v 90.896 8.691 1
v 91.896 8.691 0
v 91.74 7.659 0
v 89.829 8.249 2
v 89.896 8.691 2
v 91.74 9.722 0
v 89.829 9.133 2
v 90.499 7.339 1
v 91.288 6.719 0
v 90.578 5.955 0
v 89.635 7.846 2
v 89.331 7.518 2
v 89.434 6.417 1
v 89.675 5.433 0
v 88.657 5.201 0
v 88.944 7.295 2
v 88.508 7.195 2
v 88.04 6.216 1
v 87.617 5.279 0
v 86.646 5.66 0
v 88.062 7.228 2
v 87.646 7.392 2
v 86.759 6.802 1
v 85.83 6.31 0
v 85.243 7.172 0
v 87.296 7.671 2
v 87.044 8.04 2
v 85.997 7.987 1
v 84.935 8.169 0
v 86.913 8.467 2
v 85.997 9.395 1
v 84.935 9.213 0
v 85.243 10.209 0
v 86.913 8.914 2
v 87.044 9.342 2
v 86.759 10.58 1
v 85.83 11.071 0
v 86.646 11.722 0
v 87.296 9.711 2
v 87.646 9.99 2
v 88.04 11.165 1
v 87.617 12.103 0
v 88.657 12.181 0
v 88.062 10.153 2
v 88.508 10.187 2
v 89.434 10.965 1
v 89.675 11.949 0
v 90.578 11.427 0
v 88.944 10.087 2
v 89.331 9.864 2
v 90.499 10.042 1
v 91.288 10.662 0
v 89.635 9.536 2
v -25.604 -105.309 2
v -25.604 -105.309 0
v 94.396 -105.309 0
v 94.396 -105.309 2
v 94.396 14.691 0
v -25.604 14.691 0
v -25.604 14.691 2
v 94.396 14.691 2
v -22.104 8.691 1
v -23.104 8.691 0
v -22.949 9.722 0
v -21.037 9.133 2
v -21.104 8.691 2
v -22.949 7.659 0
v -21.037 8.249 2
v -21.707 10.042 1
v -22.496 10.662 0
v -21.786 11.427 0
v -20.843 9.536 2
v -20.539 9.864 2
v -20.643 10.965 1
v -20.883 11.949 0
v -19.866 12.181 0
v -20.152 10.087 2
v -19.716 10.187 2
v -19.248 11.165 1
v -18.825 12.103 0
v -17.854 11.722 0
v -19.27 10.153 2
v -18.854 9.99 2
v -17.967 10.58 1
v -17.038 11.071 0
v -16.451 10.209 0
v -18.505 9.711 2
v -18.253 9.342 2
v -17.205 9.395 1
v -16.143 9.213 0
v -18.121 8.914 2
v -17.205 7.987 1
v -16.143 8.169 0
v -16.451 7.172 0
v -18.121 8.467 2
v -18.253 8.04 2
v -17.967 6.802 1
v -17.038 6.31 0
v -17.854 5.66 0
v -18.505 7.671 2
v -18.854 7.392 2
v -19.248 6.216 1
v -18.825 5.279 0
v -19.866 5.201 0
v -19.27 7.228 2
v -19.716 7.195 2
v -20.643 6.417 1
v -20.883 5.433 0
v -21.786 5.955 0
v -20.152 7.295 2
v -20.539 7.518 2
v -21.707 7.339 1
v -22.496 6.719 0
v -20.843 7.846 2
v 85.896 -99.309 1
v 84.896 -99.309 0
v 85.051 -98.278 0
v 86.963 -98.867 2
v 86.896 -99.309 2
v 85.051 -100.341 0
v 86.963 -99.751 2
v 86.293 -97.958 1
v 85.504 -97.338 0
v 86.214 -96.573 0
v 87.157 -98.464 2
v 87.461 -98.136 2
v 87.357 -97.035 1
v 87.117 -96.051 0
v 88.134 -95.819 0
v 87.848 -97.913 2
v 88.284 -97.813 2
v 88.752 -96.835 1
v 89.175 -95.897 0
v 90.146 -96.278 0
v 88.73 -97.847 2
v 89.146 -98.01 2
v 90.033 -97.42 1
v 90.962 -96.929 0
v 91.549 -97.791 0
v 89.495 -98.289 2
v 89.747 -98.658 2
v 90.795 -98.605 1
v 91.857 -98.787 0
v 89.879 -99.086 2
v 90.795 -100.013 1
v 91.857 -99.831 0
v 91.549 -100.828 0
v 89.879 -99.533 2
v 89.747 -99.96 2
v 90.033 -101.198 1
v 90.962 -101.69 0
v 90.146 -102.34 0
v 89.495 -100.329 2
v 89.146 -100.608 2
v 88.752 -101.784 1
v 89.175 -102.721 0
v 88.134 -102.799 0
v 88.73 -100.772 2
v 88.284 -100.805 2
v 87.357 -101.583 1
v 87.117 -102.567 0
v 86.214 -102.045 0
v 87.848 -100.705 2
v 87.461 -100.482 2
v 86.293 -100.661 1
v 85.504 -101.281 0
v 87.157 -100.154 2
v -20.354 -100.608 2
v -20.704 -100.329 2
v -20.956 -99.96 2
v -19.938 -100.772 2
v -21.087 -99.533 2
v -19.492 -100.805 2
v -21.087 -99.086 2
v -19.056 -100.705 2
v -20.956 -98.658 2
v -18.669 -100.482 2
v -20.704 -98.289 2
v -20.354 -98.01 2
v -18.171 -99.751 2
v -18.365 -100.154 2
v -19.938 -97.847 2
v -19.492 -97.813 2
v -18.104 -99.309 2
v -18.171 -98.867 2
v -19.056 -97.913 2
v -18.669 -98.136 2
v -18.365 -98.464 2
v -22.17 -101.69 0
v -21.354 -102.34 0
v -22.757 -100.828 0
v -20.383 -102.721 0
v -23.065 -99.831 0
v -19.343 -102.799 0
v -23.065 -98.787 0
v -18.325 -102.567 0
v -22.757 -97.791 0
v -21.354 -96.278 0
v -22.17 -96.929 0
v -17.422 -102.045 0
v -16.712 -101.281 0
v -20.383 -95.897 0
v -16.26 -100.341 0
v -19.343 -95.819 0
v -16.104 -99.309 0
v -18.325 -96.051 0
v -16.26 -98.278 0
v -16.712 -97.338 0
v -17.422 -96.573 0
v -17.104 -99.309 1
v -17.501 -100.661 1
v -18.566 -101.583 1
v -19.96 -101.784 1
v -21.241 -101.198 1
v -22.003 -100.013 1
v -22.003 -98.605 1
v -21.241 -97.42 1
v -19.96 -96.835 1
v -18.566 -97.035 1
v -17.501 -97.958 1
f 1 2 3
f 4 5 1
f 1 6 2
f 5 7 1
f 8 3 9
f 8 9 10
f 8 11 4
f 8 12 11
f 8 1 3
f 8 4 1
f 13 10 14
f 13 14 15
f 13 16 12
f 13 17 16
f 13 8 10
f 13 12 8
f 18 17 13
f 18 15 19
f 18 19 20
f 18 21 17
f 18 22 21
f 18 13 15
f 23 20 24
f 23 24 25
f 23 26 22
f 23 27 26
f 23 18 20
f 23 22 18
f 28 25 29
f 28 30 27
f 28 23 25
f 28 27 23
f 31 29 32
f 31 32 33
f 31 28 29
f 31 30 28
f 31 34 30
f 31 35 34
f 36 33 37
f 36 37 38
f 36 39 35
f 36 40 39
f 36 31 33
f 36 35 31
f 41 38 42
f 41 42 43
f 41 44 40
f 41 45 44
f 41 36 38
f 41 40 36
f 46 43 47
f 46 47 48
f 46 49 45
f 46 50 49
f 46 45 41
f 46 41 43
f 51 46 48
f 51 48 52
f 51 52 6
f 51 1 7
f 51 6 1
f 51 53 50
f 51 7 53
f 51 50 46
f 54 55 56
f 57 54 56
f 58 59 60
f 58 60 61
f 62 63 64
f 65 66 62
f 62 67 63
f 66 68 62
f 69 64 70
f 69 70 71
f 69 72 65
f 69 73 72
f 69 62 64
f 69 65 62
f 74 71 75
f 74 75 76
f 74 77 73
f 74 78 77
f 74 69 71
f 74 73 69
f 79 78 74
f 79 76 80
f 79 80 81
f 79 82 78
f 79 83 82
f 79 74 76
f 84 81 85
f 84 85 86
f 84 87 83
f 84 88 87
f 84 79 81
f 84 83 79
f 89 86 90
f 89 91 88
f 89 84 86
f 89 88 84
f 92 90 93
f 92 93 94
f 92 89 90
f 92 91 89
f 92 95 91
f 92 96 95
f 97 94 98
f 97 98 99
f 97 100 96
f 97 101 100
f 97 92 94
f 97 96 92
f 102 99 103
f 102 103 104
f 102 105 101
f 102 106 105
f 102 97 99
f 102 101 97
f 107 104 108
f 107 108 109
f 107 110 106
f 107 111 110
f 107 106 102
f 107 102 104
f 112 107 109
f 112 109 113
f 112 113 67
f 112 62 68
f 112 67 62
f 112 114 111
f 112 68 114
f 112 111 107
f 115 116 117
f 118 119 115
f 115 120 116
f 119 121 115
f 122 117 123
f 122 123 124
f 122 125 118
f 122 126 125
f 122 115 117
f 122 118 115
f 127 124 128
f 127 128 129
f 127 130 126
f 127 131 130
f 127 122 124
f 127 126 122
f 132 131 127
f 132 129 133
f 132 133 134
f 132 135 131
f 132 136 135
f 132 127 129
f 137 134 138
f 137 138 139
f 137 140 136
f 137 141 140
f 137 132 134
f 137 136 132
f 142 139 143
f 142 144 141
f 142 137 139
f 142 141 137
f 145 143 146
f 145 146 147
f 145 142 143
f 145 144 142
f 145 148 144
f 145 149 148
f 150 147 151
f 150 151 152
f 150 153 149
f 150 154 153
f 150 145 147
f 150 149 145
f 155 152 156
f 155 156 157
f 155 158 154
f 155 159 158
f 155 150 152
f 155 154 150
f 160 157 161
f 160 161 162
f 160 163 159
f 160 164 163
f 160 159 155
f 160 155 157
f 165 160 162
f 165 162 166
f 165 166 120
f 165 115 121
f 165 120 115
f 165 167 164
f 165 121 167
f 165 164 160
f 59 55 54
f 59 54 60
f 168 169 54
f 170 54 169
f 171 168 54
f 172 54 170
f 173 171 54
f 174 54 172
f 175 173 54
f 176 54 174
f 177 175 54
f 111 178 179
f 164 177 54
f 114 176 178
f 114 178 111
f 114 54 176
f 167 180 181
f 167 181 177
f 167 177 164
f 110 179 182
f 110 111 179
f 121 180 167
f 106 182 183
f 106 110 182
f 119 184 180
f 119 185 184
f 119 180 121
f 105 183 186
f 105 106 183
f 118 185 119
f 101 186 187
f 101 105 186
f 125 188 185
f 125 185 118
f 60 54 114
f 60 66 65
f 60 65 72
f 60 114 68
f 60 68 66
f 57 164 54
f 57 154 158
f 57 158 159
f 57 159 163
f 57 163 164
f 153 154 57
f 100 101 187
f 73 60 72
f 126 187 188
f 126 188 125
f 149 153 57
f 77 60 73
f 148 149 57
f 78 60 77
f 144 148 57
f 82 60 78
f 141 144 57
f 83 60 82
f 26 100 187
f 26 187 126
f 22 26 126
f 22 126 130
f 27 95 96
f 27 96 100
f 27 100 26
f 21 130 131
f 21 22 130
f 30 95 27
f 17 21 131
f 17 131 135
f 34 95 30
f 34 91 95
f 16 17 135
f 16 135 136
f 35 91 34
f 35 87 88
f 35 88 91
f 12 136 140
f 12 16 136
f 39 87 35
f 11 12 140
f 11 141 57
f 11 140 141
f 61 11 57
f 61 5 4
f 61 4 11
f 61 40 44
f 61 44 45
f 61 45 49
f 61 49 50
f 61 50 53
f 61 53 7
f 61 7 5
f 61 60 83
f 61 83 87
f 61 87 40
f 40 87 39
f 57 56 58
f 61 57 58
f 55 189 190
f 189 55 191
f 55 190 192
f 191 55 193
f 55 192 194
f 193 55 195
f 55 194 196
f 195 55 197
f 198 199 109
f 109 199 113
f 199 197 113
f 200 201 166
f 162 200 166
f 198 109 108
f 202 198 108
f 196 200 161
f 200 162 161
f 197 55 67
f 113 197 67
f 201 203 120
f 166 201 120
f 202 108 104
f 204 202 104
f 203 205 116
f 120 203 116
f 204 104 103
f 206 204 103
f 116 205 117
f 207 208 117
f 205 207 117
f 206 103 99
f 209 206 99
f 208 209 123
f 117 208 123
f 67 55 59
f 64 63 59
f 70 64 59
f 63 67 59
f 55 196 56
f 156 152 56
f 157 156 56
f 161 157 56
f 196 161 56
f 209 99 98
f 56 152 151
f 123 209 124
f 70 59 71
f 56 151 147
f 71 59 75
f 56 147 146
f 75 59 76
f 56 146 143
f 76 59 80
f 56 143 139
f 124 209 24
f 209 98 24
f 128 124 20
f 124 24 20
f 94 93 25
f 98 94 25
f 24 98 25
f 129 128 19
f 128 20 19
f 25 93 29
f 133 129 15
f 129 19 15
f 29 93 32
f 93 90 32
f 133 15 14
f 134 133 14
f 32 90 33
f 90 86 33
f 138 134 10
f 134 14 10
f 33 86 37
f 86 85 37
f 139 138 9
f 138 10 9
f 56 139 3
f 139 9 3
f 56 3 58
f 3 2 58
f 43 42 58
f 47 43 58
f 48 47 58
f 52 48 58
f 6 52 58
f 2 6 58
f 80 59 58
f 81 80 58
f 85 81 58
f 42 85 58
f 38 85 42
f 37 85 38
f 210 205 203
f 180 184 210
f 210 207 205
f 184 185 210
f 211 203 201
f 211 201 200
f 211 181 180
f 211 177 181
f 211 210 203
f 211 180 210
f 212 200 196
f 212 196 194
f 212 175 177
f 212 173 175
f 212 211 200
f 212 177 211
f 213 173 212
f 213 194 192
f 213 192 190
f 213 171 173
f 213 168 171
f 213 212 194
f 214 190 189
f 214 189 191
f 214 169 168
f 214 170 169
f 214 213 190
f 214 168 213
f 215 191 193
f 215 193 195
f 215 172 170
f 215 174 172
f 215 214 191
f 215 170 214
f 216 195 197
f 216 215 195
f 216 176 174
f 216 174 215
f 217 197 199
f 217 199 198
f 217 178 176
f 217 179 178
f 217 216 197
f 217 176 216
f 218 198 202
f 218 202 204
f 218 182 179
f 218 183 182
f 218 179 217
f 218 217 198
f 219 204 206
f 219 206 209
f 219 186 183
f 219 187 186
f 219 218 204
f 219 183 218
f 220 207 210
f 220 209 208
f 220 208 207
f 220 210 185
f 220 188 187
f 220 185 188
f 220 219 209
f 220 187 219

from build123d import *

# Parameters (mm, degrees)
SKETCH1_W           = 120
SKETCH1_H           = 120
BOSS_EXTRUDE1_DEPTH = 2
SKETCH2_R           = 1.5
CUT_EXTRUDE1_DEPTH  = 3
CHAMFER1_SIZE       = 2


with BuildPart() as part:
    # Sketch1 → Boss-Extrude1 (new body)
    with BuildSketch(Plane.XY):
        with Locations((34.39590661, -45.309126743)):
            Rectangle(SKETCH1_W, SKETCH1_H)
    extrude(amount=BOSS_EXTRUDE1_DEPTH)

    # Sketch2 → Cut-Extrude1 (cut)
    with BuildSketch(Plane(origin=(0, 0, 0), x_dir=(-1, 0, 0), z_dir=(0, 0, -1))):
        with Locations((-88.39590661, -99.309126743)):
            Circle(SKETCH2_R)
        with Locations(Location((19.60409339, -99.309126743, 0), (0, 0, 180))):
            Circle(SKETCH2_R)
        with Locations((19.60409339, 8.690873257)):
            Circle(SKETCH2_R)
        with Locations(Location((-88.39590661, 8.690873257, 0), (0, 0, 180))):
            Circle(SKETCH2_R)
    extrude(amount=-CUT_EXTRUDE1_DEPTH, mode=Mode.SUBTRACT)

    # Chamfer1
    chamfer1_edges = [part.edges().sort_by_distance(p)[0] for p in [
        (89.89590661, -99.309126743, 0),
        (-21.10409339, -99.309126743, 0),
        (-18.10409339, 8.690873257, 0),
        (86.89590661, 8.690873257, 0),
    ]]
    chamfer(chamfer1_edges, length=CHAMFER1_SIZE - 0.0001)  # a hair under: the kernel refuses the full size


solid = part.part
